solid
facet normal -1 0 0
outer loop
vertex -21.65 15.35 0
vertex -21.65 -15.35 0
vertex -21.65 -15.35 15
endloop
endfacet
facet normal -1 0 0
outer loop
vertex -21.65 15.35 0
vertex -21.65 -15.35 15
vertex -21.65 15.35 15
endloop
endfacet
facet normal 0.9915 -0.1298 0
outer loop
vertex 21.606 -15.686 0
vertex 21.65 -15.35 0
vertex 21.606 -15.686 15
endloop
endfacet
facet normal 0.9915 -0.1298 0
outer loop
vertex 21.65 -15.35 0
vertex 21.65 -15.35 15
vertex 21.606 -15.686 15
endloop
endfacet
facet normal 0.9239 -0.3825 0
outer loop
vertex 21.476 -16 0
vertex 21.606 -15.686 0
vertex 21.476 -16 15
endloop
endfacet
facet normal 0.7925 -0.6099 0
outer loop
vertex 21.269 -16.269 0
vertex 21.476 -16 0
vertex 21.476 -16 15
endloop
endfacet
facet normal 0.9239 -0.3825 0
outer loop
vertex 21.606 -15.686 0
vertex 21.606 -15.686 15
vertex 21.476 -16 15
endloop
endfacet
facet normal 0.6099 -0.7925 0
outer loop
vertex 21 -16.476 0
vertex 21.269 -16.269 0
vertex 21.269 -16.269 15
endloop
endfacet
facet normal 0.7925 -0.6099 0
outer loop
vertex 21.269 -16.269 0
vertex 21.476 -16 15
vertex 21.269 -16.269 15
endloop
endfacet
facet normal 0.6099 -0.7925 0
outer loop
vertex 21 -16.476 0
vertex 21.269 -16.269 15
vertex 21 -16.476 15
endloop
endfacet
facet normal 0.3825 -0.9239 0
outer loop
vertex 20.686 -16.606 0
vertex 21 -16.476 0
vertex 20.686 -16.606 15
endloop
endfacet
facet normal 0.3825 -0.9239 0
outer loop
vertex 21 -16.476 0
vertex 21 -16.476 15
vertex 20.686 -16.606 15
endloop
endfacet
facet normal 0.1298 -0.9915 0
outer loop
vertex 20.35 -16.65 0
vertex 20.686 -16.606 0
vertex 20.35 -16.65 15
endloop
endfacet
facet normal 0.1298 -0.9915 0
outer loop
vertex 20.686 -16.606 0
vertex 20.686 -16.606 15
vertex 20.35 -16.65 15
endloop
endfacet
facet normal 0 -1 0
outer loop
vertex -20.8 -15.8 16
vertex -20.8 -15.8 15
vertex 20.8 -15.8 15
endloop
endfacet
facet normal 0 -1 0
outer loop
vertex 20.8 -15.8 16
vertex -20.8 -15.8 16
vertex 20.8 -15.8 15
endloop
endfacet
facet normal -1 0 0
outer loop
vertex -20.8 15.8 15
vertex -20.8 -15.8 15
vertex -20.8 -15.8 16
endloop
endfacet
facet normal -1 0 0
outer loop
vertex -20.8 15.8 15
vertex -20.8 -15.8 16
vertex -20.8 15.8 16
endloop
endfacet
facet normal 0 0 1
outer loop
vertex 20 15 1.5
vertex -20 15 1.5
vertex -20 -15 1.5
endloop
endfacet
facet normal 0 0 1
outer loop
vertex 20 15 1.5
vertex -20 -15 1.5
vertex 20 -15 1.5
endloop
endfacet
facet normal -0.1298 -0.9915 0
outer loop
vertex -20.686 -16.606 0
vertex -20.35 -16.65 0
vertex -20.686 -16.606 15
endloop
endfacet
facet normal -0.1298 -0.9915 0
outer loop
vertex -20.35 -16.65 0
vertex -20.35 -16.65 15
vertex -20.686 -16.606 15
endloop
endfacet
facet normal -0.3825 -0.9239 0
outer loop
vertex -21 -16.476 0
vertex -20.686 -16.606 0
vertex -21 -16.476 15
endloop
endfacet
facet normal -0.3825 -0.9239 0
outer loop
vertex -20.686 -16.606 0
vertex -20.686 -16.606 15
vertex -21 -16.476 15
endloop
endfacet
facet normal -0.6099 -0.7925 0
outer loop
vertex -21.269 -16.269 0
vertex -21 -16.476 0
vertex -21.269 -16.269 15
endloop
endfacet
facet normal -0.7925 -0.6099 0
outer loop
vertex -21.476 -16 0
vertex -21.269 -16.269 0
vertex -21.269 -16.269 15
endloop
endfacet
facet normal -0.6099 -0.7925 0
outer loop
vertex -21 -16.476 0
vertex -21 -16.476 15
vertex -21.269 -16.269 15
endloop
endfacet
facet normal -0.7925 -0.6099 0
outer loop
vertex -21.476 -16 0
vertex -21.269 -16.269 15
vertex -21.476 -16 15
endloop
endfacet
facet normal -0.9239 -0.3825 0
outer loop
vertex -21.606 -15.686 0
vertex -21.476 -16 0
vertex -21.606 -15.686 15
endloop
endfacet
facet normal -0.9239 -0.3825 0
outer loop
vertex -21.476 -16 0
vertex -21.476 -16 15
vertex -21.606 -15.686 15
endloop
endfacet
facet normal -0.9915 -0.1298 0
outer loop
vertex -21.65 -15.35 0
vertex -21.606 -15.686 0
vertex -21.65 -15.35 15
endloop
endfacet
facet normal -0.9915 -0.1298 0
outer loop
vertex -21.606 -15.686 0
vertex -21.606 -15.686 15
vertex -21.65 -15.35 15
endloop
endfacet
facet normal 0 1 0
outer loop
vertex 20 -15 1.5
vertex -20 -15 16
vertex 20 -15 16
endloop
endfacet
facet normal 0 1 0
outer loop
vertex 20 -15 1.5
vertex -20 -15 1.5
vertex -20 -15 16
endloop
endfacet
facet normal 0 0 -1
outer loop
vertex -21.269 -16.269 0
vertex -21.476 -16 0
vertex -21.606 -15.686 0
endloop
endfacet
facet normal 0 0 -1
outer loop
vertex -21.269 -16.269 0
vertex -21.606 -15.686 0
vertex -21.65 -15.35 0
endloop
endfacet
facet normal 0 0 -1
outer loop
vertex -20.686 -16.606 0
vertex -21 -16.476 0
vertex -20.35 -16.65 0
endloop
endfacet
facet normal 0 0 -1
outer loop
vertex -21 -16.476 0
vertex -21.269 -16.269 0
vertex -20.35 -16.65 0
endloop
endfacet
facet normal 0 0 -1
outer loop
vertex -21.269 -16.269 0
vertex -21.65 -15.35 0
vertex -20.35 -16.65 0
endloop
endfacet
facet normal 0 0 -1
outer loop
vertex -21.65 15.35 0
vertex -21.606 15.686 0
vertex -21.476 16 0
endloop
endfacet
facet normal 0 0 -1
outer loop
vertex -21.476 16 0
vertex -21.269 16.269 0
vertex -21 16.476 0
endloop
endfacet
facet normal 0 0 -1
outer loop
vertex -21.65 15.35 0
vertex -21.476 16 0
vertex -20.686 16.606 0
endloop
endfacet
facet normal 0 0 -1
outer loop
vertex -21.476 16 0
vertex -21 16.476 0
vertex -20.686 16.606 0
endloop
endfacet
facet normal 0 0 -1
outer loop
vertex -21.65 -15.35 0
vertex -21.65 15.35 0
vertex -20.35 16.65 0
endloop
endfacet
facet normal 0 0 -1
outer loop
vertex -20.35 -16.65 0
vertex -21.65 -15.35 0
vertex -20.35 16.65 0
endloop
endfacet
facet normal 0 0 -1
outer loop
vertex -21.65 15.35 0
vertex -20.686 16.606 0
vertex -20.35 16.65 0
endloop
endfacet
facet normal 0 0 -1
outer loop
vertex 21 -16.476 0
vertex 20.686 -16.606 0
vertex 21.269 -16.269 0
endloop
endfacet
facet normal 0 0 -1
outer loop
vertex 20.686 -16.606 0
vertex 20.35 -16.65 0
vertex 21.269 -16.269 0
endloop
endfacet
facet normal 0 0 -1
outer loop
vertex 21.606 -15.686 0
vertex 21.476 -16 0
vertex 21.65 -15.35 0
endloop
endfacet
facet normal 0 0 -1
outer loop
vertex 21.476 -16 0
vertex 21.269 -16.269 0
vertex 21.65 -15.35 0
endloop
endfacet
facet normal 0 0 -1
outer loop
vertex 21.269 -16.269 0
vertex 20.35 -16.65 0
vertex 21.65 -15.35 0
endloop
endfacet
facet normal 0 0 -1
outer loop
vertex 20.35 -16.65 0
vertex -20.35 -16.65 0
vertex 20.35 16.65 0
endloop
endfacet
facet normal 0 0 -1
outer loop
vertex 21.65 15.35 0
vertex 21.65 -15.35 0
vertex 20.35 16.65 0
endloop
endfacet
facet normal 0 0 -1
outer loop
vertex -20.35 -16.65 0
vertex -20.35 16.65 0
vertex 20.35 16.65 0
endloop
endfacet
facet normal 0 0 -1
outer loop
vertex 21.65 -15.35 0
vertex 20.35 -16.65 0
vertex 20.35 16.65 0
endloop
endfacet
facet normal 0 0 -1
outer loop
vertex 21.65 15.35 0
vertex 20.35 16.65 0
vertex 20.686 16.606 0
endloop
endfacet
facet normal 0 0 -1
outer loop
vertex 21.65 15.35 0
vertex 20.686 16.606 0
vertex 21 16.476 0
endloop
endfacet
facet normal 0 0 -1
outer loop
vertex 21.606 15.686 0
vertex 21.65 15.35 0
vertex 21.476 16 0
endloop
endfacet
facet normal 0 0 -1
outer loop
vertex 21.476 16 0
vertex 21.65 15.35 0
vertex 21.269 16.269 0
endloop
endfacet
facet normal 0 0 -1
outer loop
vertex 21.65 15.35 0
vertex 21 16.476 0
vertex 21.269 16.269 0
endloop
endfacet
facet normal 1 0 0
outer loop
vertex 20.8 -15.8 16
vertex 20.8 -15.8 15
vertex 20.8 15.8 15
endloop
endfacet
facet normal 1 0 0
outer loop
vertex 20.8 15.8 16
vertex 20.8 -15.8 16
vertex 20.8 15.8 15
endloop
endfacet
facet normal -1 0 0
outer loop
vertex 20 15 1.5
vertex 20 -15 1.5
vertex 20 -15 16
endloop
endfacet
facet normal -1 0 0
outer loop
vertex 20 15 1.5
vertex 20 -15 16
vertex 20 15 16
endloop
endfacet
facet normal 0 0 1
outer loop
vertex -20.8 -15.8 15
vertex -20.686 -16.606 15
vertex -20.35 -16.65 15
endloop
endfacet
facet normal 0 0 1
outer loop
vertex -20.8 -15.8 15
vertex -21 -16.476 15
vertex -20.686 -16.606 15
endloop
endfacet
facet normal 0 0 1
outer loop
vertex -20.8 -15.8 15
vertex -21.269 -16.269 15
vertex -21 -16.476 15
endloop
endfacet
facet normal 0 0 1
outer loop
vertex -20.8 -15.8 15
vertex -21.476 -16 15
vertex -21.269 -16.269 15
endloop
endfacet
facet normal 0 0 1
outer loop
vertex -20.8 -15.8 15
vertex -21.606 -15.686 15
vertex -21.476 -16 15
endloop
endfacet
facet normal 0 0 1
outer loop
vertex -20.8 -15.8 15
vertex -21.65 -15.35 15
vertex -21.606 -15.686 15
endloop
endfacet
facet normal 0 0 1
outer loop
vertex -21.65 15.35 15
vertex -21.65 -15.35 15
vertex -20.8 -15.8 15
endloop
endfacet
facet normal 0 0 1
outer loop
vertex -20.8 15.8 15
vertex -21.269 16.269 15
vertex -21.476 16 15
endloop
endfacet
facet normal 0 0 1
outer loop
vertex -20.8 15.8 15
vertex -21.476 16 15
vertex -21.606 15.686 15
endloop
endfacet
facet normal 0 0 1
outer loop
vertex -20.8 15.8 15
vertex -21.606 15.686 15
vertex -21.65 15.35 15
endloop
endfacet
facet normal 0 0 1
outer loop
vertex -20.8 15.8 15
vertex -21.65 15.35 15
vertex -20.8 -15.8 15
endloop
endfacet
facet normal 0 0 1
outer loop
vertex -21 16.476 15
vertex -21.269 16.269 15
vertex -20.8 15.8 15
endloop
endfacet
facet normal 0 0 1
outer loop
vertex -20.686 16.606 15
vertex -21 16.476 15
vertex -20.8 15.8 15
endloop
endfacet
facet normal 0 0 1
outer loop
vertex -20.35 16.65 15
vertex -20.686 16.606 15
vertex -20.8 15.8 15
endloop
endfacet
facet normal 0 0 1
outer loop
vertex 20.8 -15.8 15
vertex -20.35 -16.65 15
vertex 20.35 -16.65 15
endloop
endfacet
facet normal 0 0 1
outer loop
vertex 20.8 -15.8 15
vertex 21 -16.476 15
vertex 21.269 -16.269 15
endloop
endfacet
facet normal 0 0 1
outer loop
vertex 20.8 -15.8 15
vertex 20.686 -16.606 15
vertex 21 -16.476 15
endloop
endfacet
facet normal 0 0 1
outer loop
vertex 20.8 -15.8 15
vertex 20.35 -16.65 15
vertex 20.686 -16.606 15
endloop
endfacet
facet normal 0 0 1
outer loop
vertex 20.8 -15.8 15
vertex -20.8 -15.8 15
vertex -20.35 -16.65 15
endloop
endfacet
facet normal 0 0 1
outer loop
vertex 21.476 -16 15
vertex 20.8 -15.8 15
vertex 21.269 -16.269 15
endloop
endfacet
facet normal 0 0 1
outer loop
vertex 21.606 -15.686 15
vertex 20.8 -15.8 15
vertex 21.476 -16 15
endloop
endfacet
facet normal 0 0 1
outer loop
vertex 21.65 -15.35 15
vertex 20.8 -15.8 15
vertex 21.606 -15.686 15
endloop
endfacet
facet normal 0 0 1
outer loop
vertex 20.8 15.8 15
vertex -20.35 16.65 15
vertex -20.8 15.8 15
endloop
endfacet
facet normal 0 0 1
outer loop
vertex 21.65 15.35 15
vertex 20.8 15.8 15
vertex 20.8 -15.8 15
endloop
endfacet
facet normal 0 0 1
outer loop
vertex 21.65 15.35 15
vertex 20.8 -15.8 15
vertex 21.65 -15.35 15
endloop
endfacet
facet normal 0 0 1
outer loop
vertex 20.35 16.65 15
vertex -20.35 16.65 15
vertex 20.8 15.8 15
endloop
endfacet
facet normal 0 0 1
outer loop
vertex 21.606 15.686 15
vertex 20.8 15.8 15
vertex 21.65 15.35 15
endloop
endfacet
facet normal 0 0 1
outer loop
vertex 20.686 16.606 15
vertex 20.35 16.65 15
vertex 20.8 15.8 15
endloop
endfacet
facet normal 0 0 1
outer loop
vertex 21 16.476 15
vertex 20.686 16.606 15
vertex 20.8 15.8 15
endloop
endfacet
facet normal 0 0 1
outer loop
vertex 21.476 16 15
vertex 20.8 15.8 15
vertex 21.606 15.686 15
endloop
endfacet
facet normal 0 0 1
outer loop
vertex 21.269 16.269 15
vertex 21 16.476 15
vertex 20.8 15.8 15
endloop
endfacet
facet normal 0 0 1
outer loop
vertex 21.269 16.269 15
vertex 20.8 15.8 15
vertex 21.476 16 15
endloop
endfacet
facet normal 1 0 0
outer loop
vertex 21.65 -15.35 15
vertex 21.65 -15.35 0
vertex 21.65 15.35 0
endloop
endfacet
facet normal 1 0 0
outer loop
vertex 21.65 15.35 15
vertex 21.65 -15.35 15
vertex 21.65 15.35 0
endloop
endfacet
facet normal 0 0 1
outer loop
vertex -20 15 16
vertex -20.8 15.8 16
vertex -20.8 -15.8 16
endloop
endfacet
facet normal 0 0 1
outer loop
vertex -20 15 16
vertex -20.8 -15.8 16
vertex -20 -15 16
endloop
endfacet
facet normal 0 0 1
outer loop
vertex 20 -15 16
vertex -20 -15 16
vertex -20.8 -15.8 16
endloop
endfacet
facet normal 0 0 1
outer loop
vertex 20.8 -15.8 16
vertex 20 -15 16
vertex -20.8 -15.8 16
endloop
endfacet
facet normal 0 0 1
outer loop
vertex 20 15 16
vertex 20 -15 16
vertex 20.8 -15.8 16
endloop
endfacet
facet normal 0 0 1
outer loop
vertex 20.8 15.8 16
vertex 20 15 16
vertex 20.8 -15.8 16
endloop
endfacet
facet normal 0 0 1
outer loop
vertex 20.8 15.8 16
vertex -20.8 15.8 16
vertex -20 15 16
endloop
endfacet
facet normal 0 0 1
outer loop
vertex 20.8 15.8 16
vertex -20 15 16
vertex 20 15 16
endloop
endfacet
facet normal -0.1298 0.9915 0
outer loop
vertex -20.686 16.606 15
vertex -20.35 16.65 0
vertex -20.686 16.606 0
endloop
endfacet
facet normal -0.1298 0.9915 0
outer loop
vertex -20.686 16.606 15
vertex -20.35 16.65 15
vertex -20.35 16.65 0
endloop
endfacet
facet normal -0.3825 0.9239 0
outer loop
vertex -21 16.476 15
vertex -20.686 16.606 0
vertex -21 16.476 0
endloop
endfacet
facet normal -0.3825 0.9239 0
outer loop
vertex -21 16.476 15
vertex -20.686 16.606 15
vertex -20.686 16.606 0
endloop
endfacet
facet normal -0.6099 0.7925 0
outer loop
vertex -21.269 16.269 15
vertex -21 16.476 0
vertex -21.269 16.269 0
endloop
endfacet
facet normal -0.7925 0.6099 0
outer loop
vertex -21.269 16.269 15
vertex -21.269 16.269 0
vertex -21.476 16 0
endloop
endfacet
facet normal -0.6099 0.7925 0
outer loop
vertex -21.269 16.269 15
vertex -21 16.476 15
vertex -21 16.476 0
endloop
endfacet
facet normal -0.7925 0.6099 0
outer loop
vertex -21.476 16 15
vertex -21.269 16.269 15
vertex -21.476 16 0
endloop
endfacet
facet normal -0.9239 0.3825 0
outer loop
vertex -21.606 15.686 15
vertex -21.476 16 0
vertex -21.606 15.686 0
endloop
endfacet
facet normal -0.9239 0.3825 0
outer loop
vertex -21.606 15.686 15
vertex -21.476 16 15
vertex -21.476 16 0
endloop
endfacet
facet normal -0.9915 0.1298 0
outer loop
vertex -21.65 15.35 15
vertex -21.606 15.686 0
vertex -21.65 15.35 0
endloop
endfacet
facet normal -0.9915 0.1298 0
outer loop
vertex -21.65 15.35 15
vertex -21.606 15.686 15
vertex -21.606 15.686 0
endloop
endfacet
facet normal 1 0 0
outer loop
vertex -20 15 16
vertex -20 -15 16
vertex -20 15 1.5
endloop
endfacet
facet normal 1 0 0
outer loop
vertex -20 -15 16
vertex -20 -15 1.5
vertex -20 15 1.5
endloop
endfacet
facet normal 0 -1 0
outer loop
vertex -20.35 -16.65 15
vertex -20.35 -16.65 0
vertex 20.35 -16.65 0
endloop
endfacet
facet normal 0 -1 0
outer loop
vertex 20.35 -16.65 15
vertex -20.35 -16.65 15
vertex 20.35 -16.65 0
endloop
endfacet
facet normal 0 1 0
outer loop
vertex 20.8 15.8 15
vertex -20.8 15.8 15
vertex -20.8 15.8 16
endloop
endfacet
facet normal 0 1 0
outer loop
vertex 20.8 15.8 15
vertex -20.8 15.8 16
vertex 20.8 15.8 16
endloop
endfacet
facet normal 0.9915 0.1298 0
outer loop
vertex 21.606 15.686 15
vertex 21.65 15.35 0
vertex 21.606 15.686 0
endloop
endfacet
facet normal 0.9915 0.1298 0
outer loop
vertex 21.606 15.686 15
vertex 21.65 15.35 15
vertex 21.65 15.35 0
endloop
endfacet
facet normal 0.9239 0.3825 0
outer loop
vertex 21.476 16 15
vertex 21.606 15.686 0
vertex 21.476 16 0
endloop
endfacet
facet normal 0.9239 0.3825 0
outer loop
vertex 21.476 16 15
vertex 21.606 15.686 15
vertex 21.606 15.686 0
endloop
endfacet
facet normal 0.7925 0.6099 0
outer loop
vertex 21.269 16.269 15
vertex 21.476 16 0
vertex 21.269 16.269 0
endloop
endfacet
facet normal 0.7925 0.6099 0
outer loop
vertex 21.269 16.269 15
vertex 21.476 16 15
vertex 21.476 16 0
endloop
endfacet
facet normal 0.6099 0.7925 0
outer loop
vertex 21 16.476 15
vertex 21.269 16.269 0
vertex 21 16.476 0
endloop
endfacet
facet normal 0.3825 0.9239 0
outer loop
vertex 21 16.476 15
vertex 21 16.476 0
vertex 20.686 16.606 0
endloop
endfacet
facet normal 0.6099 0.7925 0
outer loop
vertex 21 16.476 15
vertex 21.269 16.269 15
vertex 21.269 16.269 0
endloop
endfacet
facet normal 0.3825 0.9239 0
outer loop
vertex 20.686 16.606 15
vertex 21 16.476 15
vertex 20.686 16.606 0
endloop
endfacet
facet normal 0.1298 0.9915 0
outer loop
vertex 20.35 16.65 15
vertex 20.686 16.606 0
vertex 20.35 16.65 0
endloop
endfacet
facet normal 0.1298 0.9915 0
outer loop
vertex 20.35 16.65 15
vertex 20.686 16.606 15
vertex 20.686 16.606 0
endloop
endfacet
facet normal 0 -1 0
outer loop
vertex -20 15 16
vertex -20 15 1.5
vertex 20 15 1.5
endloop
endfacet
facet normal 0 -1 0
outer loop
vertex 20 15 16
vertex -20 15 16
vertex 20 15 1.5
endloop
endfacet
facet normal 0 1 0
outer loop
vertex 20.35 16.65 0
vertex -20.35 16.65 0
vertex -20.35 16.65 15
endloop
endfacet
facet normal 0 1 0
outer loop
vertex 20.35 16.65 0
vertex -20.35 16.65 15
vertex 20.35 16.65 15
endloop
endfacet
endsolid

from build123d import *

# Parameters (mm, degrees)
F0_W     = 43.3
F0_H     = 33.3
F0_W_2   = 40
F0_H_2   = 30
F1_DEPTH = 15
F2_DEPTH = 1.5
F3_W     = 41.6
F3_H     = 31.6
F3_W_2   = 40
F3_H_2   = 30
F4_DEPTH = 1
F5_R     = 1.3


with BuildPart() as f1:
    # F0 (on Top) → F1 (new body)
    with BuildSketch(Plane.XY):
        Rectangle(F0_W, F0_H)
        Rectangle(F0_W_2, F0_H_2, mode=Mode.SUBTRACT)
    extrude(amount=F1_DEPTH)

    # F0 (on Top) → F2 (join)
    with BuildSketch(Plane.XY):
        Rectangle(F0_W_2, F0_H_2)
    extrude(amount=F2_DEPTH)

    # F3 (on face) → F4 (join)
    with BuildSketch(Plane.XY.offset(15)):
        Rectangle(F3_W, F3_H)
        Rectangle(F3_W_2, F3_H_2, mode=Mode.SUBTRACT)
    extrude(amount=F4_DEPTH)

    # F5
    f5_edges = [f1.edges().sort_by_distance(p)[0] for p in [
        (-21.65, -16.65, 7.5),
        (21.65, -16.65, 7.5),
        (21.65, 16.65, 7.5),
        (-21.65, 16.65, 7.5),
    ]]
    fillet(f5_edges, radius=F5_R)


solid = f1.part
